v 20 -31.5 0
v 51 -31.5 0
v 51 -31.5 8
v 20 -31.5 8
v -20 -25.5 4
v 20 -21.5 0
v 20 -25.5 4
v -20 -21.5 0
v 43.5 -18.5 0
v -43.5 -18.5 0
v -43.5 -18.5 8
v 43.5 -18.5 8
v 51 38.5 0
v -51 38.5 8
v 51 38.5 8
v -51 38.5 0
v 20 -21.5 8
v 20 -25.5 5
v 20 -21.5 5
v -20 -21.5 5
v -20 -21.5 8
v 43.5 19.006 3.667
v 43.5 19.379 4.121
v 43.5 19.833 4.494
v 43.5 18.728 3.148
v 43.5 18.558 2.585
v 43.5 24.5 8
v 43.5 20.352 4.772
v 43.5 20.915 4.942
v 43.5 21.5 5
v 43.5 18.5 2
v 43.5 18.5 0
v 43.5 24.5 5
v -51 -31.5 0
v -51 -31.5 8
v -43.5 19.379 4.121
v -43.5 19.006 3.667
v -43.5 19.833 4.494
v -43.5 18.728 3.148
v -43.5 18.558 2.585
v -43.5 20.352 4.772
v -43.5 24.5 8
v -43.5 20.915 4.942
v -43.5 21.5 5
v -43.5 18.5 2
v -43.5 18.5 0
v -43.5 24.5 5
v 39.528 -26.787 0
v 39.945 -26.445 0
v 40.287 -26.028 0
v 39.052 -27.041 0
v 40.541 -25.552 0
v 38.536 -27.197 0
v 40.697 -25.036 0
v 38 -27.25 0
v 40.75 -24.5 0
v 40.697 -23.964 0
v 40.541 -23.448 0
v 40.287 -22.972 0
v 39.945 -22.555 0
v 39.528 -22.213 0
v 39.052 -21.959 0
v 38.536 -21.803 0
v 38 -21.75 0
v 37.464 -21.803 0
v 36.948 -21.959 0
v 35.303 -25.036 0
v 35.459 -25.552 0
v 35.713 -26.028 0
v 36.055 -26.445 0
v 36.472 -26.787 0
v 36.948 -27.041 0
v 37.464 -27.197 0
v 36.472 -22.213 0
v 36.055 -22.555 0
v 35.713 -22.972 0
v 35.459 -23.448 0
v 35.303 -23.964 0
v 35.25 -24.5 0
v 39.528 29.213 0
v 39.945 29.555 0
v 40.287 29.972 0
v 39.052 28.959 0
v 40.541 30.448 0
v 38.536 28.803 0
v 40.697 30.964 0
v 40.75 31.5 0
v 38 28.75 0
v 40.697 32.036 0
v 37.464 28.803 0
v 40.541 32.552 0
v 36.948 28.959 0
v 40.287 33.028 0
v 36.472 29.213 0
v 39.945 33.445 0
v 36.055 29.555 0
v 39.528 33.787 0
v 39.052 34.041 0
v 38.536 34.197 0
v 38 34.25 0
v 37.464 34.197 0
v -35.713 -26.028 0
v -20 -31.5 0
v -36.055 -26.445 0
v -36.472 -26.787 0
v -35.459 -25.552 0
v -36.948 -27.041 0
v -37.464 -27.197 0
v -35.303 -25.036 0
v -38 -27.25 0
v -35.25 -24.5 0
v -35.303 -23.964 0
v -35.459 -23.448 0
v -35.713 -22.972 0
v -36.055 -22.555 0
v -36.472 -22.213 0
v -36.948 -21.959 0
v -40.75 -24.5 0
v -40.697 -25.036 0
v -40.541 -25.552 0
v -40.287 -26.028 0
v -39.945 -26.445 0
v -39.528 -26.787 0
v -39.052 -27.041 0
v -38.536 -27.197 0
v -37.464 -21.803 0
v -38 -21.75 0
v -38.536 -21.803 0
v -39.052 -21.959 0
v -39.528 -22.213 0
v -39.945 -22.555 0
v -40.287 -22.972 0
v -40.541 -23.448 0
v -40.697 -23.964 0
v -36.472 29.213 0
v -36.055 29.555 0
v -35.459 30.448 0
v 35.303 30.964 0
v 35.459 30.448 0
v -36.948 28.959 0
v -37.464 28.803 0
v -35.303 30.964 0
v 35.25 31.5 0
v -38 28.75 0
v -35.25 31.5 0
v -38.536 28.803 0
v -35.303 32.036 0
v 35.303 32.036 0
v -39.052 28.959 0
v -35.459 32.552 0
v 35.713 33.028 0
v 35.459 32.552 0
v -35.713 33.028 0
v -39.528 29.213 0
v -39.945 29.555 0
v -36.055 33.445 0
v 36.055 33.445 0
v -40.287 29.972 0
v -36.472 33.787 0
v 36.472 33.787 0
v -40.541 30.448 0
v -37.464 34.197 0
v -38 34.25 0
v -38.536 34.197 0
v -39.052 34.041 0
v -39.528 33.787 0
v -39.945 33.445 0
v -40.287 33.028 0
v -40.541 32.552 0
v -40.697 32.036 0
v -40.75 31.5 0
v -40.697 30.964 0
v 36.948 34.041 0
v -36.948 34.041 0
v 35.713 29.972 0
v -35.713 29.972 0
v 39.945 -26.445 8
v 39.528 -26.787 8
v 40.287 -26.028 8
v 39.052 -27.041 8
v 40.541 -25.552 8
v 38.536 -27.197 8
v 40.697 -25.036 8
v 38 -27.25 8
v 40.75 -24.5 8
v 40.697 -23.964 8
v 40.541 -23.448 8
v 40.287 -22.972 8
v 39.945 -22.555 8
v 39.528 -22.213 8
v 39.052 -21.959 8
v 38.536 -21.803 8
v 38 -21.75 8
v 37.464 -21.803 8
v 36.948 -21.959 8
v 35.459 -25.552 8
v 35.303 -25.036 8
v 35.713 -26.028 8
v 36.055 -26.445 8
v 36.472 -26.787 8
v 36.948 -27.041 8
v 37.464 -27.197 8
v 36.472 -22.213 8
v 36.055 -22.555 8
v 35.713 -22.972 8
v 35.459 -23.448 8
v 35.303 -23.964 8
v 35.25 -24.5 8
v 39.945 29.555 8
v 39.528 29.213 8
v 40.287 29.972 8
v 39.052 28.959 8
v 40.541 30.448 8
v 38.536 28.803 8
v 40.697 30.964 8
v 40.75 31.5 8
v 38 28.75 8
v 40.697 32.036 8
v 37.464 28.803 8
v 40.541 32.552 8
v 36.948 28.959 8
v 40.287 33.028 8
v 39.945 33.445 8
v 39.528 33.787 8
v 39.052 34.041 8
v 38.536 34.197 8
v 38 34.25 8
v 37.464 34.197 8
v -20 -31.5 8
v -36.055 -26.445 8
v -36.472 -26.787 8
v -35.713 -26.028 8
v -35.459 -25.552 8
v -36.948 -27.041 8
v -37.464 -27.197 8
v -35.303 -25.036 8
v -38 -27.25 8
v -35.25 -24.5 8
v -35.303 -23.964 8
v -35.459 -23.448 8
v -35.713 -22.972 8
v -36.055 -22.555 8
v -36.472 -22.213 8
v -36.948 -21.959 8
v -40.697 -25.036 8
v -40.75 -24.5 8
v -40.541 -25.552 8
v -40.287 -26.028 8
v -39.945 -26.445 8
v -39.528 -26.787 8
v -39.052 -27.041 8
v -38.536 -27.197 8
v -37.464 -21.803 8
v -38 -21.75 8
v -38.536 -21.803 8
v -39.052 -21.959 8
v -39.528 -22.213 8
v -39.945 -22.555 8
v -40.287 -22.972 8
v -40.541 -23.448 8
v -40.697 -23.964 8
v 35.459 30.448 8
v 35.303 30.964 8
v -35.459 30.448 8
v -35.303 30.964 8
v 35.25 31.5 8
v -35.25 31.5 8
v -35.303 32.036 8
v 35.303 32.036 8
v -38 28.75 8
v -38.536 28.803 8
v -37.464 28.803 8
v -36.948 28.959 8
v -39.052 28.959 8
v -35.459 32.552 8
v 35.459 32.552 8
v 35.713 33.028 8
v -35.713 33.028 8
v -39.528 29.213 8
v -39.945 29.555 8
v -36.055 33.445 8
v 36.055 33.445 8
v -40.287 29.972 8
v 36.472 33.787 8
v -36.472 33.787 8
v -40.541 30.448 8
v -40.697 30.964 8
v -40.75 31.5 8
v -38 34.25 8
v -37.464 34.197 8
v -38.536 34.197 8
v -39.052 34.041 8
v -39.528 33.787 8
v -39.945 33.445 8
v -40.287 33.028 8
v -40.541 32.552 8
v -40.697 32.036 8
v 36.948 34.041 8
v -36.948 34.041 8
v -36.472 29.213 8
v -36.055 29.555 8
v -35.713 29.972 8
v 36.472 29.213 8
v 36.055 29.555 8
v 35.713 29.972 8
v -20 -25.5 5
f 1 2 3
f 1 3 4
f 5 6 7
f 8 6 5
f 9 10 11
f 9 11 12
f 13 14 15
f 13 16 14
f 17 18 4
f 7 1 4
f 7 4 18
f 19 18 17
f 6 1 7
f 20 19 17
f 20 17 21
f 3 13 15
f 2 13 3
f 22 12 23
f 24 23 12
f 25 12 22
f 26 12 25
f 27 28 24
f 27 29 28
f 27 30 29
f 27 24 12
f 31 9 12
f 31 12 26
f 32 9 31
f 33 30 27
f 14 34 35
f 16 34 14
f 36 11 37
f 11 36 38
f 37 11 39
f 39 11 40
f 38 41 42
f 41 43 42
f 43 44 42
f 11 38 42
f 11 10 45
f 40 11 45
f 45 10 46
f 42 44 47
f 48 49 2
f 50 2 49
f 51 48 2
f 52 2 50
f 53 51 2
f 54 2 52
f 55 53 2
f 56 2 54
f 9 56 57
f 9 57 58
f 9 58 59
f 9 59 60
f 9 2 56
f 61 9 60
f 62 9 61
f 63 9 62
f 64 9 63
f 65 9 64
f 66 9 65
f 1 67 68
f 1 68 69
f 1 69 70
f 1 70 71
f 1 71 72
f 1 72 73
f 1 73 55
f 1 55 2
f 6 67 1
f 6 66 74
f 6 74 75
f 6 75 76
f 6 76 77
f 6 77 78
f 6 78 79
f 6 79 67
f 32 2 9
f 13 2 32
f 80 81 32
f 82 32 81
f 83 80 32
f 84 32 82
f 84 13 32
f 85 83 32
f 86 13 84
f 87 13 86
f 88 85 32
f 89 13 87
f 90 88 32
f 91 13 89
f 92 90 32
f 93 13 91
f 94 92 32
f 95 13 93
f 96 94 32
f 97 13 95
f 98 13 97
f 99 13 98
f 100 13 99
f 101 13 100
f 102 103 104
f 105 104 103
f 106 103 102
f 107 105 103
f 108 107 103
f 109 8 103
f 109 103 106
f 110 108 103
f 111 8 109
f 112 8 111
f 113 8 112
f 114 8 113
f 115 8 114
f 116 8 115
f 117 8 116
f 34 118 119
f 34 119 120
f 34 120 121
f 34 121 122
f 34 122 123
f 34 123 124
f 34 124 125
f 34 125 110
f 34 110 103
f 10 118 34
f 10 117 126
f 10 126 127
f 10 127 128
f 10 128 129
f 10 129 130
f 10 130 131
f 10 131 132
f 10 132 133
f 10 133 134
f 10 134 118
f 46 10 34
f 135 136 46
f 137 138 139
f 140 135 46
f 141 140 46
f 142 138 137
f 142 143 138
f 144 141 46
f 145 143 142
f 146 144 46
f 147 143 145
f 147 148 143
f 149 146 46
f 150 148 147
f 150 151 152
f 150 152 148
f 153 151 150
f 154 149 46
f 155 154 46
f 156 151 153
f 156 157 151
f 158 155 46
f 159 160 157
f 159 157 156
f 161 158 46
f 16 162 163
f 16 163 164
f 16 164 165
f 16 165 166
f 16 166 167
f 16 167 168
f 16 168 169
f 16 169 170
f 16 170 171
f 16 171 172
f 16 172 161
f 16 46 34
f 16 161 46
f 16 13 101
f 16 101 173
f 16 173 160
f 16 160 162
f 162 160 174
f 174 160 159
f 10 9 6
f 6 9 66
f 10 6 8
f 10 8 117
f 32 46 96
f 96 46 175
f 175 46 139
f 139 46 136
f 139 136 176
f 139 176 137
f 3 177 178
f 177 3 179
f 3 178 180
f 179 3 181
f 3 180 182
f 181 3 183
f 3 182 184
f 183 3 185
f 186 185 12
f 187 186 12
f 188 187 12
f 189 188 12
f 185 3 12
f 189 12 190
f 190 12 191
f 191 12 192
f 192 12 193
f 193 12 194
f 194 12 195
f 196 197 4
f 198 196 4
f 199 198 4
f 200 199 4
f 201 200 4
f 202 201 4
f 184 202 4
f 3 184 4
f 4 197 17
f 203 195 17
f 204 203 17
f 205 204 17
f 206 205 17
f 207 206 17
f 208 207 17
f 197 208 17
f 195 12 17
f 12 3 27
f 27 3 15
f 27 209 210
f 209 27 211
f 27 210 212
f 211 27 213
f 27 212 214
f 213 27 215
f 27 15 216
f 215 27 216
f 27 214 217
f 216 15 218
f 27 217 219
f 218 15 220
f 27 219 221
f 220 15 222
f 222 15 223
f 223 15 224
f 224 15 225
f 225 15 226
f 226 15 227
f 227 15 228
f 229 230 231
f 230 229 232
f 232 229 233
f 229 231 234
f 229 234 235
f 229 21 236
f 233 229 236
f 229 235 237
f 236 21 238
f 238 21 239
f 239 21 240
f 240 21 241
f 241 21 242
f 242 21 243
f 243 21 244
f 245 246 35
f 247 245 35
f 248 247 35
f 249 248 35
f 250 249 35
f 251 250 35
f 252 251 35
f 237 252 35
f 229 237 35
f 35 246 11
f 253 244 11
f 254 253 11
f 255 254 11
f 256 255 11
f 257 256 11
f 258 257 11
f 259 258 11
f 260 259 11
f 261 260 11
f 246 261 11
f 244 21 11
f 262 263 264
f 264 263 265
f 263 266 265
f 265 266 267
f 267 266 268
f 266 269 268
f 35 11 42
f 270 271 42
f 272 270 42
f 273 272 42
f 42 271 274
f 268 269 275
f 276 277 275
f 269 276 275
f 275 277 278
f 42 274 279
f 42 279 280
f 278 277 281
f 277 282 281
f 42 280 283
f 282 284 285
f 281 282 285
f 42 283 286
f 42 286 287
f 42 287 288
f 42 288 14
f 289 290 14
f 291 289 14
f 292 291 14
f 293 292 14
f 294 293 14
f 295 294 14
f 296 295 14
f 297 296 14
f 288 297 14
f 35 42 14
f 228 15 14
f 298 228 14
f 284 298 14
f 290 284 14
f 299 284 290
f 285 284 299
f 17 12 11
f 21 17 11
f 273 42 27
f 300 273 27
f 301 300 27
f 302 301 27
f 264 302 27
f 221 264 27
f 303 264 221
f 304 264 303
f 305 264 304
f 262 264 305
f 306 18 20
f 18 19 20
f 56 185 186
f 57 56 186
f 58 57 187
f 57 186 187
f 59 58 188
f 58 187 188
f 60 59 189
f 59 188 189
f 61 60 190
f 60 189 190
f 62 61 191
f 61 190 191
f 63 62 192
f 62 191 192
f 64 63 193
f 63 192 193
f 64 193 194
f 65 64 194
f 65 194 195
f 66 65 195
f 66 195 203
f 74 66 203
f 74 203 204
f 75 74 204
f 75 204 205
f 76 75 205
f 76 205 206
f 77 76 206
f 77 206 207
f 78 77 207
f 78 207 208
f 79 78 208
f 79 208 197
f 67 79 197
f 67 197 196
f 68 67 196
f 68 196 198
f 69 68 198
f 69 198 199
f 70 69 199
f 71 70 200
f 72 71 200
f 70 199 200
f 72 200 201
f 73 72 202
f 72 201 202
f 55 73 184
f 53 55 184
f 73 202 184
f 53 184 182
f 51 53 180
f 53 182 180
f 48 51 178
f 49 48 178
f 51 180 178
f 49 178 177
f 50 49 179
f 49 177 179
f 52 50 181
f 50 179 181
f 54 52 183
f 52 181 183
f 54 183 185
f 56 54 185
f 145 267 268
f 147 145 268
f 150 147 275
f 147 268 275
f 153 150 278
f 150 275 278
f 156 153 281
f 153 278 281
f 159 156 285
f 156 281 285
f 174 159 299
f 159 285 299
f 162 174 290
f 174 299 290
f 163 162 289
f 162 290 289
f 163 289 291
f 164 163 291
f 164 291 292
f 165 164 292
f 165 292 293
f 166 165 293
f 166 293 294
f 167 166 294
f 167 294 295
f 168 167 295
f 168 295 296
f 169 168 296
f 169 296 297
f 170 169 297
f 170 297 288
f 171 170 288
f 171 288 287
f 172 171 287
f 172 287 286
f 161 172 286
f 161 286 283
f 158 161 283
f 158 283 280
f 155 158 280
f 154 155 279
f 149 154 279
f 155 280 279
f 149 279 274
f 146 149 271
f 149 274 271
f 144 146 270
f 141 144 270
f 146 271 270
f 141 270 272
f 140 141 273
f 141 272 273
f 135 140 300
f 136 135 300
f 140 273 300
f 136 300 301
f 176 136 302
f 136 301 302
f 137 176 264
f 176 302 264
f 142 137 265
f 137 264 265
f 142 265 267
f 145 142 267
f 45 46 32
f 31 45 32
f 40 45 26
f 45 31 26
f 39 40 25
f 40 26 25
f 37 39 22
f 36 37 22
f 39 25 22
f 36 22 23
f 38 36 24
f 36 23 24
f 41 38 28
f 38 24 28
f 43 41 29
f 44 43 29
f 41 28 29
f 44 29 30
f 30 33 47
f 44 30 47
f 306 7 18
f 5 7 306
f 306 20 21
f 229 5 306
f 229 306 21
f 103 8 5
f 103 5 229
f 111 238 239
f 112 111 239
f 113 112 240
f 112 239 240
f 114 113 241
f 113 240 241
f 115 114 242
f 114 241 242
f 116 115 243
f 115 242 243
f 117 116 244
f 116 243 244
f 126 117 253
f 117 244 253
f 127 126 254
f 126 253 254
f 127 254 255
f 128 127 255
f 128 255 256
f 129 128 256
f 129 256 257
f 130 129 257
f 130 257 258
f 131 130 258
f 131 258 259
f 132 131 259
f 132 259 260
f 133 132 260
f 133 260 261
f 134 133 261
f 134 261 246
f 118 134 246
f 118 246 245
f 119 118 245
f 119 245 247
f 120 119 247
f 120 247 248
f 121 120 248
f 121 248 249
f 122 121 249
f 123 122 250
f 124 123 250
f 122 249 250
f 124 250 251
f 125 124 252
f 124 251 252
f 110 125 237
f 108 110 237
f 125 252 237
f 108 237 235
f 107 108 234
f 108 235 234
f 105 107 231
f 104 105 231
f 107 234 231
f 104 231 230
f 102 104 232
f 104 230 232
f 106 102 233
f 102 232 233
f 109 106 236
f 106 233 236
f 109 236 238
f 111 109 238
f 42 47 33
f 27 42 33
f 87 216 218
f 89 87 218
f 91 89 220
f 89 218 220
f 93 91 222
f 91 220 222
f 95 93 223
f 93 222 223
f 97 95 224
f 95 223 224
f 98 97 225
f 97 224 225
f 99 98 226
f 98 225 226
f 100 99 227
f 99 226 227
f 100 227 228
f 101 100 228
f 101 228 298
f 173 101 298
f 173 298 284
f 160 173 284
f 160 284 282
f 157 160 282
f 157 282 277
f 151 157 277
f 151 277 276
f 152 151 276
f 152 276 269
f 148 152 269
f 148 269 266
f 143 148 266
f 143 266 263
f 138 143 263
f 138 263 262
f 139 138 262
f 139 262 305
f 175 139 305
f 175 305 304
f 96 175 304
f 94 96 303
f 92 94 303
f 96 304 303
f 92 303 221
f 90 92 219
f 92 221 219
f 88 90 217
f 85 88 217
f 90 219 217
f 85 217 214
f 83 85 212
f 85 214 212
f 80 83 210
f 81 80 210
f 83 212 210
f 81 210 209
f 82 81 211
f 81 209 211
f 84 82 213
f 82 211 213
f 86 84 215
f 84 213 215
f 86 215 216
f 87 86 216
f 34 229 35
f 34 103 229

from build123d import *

# Parameters (mm, degrees)
SKETCH_W     = 87
SKETCH_H     = 37
PAD_DEPTH    = 5
SKETCH001_W  = 87
SKETCH001_H  = 43
PAD001_DEPTH = 3
CHAMFER_SIZE = 4
FILLET_R     = 3
SKETCH002_R  = 2.75
POCKET_DEPTH = 8.001


with BuildPart() as part:
    # Sketch → Pad (new body)
    with BuildSketch(Plane.XY):
        Polygon((-51, -31.5), (-51, 38.5), (51, 38.5), (51, -31.5), (20, -31.5), (20, -25.5), (-20, -25.5), (-20, -31.5), align=None)
        Rectangle(SKETCH_W, SKETCH_H, mode=Mode.SUBTRACT)
    extrude(amount=PAD_DEPTH)

    # Sketch001 (on Face14 of Pad) → Pad001 (join)
    with BuildSketch(Plane.XY.offset(5)):
        Polygon((-51, 38.5), (51, 38.5), (51, -31.5), (20, -31.5), (20, -21.5), (-20, -21.5), (-20, -31.5), (-51, -31.5), align=None)
        with Locations((0, 3)):
            Rectangle(SKETCH001_W, SKETCH001_H, mode=Mode.SUBTRACT)
    extrude(amount=PAD001_DEPTH)

    # Chamfer
    chamfer_edges = [part.edges().sort_by_distance(p)[0] for p in [
        (0, -25.5, 0),
    ]]
    chamfer(chamfer_edges, length=CHAMFER_SIZE)

    # Fillet
    fillet_edges = [part.edges().sort_by_distance(p)[0] for p in [
        (0, 18.5, 5),
    ]]
    fillet(fillet_edges, radius=FILLET_R)

    # Sketch002 (on Face18 of Fillet) → Pocket (cut, through all)
    with BuildSketch(Plane.XY.offset(8)):
        with Locations((-38, 31.5)):
            Circle(SKETCH002_R)
        with Locations((38, 31.5)):
            Circle(SKETCH002_R)
        with Locations((38, -24.5)):
            Circle(SKETCH002_R)
        with Locations((-38, -24.5)):
            Circle(SKETCH002_R)
    extrude(amount=-POCKET_DEPTH, mode=Mode.SUBTRACT)


solid = part.part
